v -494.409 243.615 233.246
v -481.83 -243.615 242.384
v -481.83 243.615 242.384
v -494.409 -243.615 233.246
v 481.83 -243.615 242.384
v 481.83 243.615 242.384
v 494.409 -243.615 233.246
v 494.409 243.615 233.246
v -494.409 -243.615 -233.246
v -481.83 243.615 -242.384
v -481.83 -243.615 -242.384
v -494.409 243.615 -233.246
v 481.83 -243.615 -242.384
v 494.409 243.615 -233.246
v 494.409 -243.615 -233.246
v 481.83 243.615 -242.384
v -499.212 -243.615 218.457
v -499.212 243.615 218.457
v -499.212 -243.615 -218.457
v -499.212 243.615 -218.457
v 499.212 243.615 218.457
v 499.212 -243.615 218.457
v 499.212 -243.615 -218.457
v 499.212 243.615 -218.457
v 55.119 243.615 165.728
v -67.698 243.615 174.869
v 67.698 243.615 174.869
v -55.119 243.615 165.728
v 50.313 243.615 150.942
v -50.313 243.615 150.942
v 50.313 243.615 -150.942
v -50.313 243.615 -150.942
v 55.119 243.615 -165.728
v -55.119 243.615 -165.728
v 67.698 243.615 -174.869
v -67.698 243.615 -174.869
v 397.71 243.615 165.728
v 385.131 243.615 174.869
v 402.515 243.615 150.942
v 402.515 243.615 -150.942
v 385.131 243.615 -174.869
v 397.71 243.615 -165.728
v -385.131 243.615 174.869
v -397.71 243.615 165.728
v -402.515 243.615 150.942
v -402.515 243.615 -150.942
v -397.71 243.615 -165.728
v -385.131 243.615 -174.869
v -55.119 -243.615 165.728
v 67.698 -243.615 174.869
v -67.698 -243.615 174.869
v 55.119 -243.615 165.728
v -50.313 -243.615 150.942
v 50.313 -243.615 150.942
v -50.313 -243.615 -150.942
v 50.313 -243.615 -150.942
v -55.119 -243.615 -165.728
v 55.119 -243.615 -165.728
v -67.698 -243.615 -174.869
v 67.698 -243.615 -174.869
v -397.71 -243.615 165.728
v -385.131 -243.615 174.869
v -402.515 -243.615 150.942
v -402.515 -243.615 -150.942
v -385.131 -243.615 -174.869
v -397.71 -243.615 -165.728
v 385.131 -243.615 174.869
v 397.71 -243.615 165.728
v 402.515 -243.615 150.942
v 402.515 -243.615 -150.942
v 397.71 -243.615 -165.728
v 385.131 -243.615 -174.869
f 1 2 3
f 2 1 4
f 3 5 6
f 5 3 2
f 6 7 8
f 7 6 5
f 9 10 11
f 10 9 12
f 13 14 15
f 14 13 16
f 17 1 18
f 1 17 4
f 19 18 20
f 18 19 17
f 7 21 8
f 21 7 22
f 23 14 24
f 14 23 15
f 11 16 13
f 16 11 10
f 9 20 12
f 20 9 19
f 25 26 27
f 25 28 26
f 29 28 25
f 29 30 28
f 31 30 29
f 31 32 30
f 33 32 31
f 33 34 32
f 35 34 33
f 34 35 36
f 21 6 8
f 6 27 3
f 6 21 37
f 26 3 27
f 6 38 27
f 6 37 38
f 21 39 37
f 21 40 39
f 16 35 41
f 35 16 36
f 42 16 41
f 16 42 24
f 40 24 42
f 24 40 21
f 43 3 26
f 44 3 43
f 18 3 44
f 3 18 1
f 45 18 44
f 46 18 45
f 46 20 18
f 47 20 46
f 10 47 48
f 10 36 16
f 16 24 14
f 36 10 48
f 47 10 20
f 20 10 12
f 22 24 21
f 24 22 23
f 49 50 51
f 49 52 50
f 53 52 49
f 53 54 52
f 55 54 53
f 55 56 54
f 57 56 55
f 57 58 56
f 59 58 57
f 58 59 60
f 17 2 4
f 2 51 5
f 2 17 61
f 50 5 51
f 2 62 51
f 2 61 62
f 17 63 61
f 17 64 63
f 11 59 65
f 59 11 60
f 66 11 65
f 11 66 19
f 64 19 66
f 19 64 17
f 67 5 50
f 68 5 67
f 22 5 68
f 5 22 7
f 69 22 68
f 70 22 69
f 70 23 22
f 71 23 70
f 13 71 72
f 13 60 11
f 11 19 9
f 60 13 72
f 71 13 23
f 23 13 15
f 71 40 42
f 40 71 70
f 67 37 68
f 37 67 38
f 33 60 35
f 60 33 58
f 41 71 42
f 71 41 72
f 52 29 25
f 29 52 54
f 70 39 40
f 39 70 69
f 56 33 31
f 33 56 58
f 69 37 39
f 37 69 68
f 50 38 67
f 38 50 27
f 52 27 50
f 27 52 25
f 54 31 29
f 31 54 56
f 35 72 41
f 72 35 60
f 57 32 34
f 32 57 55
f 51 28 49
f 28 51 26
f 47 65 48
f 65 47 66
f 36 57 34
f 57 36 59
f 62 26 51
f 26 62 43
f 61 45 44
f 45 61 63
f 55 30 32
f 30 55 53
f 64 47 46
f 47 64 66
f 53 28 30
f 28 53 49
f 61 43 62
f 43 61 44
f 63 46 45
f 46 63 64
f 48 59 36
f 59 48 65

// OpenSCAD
$fn=10;

sf=1/0.0003975;//Scale factor to match leocad

rotate([90,0,0])scale([sf,sf,sf]){
difference(){
 roundedRectangle([0.396875,0.193675,0.193675],0.01);
 translate([0.09,0,0])roundedRectangle([0.14,0.14,0.2],0.01);
 translate([-0.09,0,0])roundedRectangle([0.14,0.14,0.2],0.01);
}
}


module roundedRectangle(s=[1,1,1],r=0){
 hull(){
  translate([-s[0]/2+r,-s[1]/2+r,0])cylinder(r=r,h=s[2],center=true);
  translate([-s[0]/2+r,s[1]/2-r,0])cylinder(r=r,h=s[2],center=true);
  translate([s[0]/2-r,-s[1]/2+r,0])cylinder(r=r,h=s[2],center=true);
  translate([s[0]/2-r,s[1]/2-r,0])cylinder(r=r,h=s[2],center=true);
 }
}
